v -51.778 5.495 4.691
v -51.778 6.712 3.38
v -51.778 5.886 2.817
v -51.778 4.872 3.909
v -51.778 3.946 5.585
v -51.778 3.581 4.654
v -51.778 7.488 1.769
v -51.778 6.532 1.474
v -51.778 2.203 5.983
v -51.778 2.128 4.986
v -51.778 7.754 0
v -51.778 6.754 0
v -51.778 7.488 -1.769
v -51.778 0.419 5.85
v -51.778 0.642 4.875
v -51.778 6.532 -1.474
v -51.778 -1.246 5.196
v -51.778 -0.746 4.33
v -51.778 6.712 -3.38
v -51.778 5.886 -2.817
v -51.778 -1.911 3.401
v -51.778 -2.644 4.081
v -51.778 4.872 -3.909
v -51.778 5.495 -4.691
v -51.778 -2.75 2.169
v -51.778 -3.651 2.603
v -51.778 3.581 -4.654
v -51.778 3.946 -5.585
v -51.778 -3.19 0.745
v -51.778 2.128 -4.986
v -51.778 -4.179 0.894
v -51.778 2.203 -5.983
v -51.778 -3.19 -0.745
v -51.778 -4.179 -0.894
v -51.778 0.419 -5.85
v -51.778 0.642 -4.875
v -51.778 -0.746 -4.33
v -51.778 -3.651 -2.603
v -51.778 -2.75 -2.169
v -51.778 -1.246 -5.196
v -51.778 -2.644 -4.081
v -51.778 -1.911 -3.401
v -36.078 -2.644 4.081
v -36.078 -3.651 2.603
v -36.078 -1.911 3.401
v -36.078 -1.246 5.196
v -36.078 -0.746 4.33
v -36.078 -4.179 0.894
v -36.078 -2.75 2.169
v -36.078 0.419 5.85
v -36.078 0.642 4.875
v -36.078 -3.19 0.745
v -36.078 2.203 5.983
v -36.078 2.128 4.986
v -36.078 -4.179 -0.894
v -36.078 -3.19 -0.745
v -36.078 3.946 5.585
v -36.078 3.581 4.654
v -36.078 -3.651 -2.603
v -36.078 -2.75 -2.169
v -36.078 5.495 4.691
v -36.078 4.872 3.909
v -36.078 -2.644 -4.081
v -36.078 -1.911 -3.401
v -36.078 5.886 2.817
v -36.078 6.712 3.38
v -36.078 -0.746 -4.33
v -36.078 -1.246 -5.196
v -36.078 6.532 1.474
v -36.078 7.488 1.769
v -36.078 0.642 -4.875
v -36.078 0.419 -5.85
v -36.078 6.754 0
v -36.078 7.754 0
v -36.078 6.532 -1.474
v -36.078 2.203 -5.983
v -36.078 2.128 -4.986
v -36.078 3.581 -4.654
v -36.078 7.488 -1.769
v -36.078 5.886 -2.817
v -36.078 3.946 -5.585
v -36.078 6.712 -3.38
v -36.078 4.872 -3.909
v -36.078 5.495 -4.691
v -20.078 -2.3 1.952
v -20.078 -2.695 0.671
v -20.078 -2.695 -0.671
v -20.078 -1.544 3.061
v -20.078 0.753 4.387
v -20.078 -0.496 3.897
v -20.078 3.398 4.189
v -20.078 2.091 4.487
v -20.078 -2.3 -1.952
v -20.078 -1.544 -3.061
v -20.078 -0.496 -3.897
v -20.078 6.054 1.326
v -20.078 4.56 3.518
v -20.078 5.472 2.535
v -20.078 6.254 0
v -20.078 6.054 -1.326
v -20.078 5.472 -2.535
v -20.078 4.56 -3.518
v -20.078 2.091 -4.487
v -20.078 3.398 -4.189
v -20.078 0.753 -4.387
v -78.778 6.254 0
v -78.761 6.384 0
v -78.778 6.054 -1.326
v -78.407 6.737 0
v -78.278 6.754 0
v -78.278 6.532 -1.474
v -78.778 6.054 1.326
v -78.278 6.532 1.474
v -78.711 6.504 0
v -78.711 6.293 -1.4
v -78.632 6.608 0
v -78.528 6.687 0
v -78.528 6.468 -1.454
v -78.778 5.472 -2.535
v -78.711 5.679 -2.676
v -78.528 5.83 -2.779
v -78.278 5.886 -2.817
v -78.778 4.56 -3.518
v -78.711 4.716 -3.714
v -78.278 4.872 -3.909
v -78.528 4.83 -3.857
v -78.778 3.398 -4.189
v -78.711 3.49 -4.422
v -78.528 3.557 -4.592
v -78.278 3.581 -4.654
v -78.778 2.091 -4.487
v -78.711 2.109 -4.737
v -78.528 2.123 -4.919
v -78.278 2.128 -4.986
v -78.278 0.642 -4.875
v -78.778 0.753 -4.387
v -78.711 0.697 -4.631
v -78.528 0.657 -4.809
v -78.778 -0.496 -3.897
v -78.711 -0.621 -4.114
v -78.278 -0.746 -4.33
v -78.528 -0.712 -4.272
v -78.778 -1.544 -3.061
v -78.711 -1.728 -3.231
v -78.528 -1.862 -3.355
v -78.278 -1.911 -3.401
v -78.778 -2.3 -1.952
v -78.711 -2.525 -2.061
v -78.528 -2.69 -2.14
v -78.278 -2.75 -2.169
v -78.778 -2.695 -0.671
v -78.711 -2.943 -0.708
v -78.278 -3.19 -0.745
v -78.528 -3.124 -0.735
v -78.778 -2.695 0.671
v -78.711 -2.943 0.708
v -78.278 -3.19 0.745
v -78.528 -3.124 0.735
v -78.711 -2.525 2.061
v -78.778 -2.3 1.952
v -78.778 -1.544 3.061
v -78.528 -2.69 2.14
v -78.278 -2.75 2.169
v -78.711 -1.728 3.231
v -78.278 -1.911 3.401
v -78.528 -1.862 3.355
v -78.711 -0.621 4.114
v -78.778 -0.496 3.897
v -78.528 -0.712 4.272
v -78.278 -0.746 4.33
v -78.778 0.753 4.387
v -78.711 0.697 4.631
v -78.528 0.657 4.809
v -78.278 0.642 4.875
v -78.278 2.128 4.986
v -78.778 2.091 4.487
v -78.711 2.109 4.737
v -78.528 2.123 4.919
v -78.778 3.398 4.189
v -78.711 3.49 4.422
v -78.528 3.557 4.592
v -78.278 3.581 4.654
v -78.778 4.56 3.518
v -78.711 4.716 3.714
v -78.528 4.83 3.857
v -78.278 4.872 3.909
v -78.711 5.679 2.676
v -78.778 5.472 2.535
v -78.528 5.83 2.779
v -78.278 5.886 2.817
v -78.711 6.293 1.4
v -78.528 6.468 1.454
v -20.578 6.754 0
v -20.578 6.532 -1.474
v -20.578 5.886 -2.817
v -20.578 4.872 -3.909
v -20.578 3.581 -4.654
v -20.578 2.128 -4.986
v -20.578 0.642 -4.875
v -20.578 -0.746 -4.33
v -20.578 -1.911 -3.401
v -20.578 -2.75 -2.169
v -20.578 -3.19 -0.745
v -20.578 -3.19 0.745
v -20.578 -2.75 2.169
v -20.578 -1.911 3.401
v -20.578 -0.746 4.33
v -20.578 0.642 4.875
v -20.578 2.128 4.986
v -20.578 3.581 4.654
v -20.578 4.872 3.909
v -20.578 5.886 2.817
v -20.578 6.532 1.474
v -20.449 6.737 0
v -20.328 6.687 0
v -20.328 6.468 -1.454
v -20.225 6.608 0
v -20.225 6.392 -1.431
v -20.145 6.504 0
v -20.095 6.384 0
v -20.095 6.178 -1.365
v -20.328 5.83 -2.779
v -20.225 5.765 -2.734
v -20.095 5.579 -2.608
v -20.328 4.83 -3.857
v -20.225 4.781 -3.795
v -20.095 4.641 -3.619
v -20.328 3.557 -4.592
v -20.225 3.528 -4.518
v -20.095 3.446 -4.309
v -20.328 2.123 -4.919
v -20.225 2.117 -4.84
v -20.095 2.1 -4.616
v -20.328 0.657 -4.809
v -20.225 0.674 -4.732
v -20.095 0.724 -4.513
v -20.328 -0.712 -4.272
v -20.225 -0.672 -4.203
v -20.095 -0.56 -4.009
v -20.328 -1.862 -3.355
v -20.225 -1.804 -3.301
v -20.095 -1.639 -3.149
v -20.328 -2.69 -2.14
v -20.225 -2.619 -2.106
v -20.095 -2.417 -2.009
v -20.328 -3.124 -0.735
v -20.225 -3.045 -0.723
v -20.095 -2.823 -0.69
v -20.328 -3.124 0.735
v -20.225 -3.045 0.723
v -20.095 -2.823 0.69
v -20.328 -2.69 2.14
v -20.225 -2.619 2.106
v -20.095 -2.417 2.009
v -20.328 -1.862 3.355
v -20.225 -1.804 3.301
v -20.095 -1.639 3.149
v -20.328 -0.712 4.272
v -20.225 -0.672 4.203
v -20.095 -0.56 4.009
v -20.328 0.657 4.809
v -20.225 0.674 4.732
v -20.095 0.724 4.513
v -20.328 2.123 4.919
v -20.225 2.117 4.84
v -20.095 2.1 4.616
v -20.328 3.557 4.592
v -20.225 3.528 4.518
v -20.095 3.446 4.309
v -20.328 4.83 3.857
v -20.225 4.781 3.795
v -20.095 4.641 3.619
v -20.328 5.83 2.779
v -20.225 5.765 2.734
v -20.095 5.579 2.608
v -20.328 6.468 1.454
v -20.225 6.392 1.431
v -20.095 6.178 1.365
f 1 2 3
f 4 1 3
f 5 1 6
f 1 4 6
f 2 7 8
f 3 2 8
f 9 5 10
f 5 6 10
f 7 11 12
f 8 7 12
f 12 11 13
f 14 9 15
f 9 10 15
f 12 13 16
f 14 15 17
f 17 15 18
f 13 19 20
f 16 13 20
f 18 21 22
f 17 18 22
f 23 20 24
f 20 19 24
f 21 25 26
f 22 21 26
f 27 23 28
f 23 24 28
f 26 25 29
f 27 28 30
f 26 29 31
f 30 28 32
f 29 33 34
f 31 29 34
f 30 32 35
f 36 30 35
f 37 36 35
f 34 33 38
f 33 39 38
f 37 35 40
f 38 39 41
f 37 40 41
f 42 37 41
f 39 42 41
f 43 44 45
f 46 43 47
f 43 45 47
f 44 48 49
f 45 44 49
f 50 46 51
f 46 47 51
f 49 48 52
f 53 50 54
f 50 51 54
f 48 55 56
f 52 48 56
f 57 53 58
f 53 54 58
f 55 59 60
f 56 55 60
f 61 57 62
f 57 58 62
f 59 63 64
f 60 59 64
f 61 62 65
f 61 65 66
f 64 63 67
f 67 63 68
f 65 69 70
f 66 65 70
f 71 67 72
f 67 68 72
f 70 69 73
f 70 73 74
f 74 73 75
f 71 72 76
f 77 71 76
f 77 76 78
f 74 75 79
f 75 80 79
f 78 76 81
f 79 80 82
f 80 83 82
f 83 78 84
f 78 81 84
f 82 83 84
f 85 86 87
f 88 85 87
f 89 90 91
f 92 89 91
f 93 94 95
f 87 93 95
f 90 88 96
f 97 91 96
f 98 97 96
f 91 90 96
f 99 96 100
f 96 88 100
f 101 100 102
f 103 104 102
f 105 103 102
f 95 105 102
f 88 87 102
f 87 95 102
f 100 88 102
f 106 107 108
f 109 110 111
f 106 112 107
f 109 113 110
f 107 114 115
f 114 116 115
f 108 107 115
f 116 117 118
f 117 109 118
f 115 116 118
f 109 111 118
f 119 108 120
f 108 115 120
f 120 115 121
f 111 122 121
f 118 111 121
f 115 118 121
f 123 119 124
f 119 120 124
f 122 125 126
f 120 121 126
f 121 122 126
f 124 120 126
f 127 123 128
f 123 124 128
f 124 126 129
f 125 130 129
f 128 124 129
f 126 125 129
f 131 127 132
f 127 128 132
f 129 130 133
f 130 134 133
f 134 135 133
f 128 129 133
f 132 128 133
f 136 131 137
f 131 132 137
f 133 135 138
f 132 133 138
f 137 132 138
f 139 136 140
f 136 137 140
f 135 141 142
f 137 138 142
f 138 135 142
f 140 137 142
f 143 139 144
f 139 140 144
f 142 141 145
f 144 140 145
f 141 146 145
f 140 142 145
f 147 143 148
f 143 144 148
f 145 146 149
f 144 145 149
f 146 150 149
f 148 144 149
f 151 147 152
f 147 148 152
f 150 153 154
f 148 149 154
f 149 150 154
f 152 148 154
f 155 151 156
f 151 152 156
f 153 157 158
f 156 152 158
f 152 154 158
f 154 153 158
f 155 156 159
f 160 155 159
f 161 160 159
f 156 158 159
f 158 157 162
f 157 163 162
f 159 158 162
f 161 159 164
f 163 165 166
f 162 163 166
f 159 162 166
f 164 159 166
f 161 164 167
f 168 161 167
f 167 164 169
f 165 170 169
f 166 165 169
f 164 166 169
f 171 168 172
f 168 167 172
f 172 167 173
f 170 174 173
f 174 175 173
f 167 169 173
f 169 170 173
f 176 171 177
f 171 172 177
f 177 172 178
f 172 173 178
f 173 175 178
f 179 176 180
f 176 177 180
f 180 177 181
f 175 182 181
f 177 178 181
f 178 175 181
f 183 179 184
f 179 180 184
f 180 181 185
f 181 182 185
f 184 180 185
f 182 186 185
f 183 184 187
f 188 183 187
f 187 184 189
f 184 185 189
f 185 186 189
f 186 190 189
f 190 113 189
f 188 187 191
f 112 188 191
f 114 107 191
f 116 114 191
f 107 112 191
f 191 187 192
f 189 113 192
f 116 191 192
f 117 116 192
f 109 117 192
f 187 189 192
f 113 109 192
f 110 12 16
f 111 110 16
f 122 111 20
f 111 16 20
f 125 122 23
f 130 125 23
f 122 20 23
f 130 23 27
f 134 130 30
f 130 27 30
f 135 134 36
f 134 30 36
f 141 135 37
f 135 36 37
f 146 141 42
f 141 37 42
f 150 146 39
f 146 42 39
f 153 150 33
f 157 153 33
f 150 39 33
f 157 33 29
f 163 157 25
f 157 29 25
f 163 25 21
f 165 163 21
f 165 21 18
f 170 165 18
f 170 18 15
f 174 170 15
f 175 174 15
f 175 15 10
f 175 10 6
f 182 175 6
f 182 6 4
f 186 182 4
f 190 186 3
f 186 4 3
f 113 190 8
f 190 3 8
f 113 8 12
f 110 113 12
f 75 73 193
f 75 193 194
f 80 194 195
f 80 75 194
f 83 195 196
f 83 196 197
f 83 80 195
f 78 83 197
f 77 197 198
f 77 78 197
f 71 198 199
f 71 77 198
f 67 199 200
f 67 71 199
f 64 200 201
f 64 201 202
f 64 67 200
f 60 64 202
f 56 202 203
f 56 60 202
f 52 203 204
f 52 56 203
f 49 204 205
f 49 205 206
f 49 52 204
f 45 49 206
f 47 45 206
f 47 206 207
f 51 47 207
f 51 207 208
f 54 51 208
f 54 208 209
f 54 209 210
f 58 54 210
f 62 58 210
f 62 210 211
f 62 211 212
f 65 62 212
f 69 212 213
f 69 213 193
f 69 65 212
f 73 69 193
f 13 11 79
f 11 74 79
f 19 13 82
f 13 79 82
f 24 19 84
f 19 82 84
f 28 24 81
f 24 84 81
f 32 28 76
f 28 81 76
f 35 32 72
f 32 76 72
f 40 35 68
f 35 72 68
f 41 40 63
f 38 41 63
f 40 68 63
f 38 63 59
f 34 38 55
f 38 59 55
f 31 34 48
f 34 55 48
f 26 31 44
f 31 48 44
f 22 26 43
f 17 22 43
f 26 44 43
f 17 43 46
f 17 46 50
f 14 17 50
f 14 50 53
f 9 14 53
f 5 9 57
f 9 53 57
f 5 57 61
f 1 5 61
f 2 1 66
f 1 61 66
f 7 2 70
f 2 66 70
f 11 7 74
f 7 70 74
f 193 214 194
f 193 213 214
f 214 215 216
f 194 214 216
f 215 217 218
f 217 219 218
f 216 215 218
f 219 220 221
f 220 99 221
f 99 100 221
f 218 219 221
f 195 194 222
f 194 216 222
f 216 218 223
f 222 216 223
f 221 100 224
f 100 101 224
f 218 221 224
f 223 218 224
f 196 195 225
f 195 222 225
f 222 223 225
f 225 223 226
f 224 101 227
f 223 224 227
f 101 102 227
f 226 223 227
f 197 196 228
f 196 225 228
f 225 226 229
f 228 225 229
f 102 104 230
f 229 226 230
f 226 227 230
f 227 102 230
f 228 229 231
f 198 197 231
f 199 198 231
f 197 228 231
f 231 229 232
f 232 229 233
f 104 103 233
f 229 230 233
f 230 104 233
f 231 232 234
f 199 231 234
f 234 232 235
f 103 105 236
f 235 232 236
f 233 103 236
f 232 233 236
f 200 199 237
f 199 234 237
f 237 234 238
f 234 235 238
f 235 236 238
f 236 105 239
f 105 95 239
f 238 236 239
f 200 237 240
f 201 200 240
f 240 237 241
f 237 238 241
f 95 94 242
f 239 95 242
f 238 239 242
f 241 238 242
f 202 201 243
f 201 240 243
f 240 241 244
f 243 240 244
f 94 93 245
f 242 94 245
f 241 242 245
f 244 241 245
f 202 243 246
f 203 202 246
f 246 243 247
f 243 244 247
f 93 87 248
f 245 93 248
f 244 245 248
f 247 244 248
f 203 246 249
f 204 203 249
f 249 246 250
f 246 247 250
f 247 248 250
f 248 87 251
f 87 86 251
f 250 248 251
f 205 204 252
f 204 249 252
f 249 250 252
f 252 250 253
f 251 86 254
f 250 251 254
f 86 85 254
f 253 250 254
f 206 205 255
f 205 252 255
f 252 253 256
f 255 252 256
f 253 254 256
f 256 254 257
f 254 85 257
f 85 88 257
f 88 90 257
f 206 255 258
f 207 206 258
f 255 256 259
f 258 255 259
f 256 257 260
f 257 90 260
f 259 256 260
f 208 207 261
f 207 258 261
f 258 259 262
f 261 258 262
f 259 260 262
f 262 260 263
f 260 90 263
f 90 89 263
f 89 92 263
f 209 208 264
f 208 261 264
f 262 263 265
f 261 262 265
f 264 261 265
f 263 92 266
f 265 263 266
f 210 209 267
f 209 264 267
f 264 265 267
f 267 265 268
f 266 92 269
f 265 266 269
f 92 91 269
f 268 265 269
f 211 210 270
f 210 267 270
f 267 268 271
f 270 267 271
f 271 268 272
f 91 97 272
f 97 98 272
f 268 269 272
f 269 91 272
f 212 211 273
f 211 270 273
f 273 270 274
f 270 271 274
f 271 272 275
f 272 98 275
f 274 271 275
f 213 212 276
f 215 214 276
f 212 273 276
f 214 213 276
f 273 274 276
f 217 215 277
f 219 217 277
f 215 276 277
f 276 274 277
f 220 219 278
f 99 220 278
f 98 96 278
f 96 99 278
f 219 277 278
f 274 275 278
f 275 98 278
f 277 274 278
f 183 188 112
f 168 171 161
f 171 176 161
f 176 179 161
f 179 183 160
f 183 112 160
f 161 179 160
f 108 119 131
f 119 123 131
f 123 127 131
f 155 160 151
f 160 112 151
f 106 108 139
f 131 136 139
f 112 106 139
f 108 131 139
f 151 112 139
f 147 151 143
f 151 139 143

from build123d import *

# Parameters (mm, degrees)
VERRUNDUNG1_R = 0.5


with BuildPart() as part:
    # Skizze1 → Rotation1 (revolve)
    with BuildSketch(Plane.XY):
        Polygon((-78.778077973, 1.754378812), (-78.778077973, 6.754378812), (-51.778077973, 6.754378812), (-51.778077973, 7.754378812), (-36.078077973, 7.754378812), (-36.078077973, 6.754378812), (-26.078077973, 6.754378812), (-25.078077973, 6.754378812), (-20.078077973, 6.754378812), (-20.078077973, 1.754378812), align=None)
    revolve(axis=Axis((-20.078077973, 1.754378812, 0), (-1, 0, 0)))

    # Verrundung1
    verrundung1_edges = [part.edges().sort_by_distance(p)[0] for p in [
        (-78.778077973, -3.245621188, 0),
        (-20.078077973, -3.245621188, 0),
    ]]
    fillet(verrundung1_edges, radius=VERRUNDUNG1_R)


solid = part.part
